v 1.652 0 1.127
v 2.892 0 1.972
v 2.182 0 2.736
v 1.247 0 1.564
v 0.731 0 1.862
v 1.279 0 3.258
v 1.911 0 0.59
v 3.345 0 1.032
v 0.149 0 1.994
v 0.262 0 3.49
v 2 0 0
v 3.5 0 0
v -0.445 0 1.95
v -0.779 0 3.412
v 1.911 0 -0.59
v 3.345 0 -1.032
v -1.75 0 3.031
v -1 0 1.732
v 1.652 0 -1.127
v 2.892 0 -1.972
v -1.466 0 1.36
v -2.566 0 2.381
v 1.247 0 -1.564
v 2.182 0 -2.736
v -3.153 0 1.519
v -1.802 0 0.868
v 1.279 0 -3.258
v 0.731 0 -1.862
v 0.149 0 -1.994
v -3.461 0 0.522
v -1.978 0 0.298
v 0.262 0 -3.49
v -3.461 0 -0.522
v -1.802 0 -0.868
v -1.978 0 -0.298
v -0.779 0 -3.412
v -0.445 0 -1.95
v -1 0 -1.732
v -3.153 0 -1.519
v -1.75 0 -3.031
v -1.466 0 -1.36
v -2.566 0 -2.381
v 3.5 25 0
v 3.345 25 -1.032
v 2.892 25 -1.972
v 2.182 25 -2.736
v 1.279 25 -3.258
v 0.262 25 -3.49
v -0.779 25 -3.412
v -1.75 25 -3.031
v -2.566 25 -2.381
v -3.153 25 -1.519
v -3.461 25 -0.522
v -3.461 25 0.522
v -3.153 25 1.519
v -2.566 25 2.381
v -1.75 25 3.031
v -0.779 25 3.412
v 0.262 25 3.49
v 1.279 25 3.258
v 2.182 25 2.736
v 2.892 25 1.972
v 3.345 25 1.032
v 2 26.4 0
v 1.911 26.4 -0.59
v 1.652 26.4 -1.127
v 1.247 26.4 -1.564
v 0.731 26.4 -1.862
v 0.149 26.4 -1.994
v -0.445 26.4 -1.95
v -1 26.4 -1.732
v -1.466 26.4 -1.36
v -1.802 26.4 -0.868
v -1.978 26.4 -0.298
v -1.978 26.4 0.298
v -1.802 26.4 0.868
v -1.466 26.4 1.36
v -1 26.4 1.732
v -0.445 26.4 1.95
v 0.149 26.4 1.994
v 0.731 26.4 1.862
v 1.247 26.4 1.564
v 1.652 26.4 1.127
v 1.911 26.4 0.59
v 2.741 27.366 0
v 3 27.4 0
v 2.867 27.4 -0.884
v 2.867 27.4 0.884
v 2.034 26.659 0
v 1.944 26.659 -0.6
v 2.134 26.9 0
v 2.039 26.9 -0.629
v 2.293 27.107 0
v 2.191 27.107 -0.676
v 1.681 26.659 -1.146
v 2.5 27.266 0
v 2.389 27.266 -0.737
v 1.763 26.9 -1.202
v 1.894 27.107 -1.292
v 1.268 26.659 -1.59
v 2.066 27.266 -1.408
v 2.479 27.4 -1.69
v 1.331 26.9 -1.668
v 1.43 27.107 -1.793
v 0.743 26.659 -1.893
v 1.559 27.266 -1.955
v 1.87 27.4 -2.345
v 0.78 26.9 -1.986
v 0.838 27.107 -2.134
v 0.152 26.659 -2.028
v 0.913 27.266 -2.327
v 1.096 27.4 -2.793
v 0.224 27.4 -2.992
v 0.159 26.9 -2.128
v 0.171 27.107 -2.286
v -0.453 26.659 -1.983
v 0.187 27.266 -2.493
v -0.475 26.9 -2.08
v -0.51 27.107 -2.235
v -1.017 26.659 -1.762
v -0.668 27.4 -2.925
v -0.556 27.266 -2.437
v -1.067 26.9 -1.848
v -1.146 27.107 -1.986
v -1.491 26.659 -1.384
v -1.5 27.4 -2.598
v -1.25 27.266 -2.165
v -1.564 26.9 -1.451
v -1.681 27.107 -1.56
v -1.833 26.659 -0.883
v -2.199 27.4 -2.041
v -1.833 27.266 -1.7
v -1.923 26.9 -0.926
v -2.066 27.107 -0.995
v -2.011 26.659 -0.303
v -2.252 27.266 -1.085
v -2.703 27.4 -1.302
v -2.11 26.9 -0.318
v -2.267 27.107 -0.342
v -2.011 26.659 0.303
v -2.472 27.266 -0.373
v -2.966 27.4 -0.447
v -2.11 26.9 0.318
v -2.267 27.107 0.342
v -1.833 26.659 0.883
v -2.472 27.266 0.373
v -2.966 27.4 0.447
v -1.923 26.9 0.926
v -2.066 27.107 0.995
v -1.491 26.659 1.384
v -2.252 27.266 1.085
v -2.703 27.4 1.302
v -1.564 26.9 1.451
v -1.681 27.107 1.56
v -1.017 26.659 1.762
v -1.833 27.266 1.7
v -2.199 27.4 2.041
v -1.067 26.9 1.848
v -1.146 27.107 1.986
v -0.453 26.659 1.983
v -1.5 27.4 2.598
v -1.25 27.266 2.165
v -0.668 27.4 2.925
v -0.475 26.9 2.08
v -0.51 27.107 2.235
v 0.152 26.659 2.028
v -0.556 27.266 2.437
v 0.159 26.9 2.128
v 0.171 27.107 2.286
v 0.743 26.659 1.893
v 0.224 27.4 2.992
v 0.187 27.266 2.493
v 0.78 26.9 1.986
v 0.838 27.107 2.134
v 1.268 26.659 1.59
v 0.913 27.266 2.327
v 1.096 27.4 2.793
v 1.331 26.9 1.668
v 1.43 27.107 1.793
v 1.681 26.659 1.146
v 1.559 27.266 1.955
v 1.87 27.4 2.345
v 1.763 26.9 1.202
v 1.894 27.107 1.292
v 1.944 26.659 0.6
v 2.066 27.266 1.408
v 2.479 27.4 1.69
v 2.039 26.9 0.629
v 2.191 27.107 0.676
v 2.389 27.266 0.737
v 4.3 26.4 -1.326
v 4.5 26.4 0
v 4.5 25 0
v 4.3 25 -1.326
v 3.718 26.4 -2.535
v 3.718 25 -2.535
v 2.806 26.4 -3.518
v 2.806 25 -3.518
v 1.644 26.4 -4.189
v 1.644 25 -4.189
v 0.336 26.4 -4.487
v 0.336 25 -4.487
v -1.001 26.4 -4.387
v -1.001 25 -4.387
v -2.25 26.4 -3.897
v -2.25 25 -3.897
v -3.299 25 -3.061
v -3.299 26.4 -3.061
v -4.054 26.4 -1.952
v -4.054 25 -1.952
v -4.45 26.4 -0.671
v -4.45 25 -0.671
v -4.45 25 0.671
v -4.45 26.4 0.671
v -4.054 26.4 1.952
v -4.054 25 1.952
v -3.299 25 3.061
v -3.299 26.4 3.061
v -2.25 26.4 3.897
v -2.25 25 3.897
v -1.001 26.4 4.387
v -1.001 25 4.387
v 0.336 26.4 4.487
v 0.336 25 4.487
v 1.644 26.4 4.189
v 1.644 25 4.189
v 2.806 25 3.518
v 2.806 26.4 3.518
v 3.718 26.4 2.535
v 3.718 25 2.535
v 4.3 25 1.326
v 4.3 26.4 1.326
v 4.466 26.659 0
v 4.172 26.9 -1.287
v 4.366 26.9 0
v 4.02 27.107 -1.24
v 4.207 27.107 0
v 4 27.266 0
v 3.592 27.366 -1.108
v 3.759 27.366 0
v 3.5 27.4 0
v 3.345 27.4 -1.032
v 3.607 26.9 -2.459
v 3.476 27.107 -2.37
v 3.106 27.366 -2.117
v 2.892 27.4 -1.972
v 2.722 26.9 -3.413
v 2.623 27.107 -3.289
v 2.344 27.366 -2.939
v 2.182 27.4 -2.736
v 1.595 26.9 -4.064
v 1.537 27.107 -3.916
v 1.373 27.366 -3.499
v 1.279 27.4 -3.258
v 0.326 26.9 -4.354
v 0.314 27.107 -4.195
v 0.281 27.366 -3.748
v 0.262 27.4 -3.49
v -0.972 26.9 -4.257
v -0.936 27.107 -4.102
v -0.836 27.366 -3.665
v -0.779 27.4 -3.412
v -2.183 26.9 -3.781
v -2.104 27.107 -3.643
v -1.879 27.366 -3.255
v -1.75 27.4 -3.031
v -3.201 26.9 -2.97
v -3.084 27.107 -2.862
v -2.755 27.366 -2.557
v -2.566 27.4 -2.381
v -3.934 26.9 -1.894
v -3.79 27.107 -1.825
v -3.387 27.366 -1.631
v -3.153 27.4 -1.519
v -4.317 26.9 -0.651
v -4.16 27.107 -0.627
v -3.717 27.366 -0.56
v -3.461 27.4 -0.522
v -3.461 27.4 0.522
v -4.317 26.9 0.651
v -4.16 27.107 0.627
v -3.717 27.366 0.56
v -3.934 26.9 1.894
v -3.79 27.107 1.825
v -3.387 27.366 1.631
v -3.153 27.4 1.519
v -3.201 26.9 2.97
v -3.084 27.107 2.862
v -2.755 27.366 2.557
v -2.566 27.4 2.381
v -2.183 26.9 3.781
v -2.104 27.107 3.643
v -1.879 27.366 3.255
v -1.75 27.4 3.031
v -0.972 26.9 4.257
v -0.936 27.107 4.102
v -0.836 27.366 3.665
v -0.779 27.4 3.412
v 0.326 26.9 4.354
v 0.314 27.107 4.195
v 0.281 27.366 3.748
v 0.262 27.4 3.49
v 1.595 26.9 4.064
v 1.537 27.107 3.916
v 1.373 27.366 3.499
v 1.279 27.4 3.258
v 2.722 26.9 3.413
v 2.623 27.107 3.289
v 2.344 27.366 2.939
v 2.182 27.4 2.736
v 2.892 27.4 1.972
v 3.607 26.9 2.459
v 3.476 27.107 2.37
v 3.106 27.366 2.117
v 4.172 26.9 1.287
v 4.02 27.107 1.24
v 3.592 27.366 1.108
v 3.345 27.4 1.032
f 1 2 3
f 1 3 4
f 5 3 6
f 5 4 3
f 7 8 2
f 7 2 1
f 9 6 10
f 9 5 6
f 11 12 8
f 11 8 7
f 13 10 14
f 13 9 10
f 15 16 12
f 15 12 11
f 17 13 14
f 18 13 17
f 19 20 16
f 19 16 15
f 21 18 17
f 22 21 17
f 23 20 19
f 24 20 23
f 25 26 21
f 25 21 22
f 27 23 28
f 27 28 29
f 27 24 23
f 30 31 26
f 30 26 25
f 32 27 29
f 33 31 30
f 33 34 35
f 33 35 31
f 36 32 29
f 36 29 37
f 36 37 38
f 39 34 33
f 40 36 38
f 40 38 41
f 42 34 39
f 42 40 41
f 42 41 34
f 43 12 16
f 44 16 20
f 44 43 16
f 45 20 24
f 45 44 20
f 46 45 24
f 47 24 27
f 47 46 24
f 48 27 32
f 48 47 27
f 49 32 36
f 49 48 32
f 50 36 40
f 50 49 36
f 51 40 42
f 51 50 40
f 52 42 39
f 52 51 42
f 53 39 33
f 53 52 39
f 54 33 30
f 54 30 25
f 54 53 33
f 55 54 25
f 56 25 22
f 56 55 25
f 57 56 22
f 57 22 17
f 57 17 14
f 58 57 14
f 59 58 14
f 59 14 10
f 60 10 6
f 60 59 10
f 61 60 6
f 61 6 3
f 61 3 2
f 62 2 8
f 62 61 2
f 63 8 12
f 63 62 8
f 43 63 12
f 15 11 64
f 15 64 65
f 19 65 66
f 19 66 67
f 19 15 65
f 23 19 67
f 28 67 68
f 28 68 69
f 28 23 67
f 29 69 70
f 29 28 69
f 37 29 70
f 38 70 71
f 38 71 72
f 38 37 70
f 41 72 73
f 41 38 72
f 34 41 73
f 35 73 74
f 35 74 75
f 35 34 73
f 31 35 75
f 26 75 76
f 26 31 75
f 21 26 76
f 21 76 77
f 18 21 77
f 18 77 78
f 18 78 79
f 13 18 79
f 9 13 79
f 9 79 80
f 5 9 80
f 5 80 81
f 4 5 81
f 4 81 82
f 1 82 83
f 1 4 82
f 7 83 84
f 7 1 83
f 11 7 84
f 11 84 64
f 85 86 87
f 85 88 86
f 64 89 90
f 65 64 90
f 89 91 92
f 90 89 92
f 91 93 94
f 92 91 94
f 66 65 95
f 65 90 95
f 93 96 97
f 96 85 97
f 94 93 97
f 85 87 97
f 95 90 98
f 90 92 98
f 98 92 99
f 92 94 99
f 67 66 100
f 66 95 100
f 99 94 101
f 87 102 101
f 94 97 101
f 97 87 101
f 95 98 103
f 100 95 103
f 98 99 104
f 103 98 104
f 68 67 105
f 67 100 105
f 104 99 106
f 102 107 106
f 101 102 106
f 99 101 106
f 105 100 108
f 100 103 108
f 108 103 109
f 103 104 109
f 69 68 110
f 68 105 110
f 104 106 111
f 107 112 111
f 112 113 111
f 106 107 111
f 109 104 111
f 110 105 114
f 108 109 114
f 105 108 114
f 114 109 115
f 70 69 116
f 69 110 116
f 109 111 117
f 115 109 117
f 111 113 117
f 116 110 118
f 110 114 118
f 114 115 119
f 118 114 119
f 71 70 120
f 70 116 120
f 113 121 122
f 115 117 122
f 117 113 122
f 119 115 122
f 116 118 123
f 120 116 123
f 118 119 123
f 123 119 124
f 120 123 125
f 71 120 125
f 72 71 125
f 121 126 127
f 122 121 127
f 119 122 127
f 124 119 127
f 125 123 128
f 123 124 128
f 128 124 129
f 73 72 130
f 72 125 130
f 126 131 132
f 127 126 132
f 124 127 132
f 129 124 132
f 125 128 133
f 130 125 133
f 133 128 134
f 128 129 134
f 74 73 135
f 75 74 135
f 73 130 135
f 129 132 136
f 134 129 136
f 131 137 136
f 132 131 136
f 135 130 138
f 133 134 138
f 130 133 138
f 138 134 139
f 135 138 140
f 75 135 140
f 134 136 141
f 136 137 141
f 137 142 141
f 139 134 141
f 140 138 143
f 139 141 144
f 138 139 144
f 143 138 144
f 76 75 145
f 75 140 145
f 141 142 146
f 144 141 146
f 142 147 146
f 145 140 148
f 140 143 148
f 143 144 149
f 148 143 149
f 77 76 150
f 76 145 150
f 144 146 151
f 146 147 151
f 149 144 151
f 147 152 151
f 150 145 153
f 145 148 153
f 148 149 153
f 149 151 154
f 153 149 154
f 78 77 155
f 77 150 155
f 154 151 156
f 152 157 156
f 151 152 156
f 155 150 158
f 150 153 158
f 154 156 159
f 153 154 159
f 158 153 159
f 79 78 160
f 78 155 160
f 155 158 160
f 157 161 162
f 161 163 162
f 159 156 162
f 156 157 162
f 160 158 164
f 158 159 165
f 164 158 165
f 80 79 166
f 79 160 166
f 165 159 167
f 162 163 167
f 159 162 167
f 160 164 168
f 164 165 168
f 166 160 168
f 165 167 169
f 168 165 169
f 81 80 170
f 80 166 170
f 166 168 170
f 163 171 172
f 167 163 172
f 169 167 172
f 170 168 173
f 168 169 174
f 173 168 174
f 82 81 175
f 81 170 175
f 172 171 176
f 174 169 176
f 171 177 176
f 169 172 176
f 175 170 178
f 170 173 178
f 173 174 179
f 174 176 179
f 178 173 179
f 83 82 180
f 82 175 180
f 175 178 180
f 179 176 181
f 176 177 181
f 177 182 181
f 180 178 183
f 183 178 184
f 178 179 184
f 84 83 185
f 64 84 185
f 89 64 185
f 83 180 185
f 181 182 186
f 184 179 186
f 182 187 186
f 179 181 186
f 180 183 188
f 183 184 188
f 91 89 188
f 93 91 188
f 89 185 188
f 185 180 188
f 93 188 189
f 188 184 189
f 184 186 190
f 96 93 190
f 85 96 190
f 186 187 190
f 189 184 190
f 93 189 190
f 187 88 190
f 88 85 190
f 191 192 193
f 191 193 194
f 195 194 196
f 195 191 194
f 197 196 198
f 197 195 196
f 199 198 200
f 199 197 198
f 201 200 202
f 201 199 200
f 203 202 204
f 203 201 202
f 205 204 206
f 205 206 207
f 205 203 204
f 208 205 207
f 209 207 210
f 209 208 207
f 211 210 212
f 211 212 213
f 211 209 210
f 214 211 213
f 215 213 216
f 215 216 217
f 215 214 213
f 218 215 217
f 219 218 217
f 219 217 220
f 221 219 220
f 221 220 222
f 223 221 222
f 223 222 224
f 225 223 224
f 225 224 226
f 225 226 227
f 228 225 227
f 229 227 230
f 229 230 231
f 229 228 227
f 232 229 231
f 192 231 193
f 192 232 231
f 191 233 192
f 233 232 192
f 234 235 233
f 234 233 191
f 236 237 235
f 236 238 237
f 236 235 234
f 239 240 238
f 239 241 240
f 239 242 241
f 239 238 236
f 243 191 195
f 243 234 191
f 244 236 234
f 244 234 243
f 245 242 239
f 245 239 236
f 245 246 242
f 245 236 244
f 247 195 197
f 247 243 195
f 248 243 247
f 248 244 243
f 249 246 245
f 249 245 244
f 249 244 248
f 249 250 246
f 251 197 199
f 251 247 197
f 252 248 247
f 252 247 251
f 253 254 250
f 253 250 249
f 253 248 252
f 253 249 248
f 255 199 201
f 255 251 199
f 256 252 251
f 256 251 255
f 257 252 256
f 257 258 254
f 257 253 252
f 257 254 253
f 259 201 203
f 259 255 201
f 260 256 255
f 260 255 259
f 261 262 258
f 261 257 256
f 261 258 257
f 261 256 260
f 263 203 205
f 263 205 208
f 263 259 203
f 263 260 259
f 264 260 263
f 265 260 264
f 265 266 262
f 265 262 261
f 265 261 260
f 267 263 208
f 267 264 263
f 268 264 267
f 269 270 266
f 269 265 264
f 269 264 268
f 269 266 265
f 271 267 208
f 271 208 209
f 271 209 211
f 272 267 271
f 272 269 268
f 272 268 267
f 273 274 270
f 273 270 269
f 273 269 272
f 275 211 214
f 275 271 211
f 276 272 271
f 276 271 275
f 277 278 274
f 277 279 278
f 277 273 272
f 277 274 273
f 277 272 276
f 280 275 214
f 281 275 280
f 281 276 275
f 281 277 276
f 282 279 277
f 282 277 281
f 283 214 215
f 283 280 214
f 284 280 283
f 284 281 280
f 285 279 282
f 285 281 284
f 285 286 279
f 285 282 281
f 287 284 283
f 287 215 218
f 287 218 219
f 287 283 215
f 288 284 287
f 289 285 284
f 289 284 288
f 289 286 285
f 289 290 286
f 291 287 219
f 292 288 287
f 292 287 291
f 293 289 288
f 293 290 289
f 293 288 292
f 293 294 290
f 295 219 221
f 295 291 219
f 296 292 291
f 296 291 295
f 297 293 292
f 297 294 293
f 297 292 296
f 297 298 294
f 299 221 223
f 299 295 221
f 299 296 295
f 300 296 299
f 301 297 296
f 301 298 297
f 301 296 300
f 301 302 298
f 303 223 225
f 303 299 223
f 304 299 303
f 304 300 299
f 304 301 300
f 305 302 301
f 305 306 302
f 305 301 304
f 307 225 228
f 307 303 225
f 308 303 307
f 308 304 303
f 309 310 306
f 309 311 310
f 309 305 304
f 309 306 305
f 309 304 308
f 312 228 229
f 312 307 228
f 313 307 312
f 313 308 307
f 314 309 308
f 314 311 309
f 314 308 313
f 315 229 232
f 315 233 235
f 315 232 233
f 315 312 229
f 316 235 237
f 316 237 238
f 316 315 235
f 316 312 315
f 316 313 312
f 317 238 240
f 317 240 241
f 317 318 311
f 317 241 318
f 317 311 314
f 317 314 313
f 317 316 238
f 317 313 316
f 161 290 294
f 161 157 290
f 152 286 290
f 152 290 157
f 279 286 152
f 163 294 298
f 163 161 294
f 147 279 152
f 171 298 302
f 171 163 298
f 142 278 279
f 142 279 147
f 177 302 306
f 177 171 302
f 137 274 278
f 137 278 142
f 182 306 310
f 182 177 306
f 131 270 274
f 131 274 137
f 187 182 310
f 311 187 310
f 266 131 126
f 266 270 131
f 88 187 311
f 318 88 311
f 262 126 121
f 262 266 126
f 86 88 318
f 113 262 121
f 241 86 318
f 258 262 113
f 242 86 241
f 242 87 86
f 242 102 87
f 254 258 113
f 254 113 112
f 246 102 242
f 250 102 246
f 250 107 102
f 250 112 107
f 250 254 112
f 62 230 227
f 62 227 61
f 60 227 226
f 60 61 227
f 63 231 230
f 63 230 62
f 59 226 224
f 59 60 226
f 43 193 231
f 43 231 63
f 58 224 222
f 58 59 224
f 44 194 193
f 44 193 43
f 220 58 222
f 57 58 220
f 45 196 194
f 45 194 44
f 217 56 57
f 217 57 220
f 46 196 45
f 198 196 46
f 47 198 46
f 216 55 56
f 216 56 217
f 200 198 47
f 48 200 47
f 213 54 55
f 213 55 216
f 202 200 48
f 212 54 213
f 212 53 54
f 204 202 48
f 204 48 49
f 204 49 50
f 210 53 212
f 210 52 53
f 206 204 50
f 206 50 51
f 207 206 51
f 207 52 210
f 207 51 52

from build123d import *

# Parameters (mm, degrees)
F2_R = 1


with BuildPart() as f1:
    # F0 (on Top) → F1 (revolve)
    with BuildSketch(Plane.XY):
        Polygon((2, 27.4), (2, 0), (3.5, 0), (3.5, 25), (4.5, 25), (4.5, 27.4), align=None)
    revolve(axis=Axis((0, 13.997055, 0), (0, 1, 0)))

    # F2
    f2_edges = [f1.edges().sort_by_distance(p)[0] for p in [
        (-4.5, 27.4, 0),
        (-2, 27.4, 0),
    ]]
    fillet(f2_edges, radius=F2_R)


solid = f1.part
